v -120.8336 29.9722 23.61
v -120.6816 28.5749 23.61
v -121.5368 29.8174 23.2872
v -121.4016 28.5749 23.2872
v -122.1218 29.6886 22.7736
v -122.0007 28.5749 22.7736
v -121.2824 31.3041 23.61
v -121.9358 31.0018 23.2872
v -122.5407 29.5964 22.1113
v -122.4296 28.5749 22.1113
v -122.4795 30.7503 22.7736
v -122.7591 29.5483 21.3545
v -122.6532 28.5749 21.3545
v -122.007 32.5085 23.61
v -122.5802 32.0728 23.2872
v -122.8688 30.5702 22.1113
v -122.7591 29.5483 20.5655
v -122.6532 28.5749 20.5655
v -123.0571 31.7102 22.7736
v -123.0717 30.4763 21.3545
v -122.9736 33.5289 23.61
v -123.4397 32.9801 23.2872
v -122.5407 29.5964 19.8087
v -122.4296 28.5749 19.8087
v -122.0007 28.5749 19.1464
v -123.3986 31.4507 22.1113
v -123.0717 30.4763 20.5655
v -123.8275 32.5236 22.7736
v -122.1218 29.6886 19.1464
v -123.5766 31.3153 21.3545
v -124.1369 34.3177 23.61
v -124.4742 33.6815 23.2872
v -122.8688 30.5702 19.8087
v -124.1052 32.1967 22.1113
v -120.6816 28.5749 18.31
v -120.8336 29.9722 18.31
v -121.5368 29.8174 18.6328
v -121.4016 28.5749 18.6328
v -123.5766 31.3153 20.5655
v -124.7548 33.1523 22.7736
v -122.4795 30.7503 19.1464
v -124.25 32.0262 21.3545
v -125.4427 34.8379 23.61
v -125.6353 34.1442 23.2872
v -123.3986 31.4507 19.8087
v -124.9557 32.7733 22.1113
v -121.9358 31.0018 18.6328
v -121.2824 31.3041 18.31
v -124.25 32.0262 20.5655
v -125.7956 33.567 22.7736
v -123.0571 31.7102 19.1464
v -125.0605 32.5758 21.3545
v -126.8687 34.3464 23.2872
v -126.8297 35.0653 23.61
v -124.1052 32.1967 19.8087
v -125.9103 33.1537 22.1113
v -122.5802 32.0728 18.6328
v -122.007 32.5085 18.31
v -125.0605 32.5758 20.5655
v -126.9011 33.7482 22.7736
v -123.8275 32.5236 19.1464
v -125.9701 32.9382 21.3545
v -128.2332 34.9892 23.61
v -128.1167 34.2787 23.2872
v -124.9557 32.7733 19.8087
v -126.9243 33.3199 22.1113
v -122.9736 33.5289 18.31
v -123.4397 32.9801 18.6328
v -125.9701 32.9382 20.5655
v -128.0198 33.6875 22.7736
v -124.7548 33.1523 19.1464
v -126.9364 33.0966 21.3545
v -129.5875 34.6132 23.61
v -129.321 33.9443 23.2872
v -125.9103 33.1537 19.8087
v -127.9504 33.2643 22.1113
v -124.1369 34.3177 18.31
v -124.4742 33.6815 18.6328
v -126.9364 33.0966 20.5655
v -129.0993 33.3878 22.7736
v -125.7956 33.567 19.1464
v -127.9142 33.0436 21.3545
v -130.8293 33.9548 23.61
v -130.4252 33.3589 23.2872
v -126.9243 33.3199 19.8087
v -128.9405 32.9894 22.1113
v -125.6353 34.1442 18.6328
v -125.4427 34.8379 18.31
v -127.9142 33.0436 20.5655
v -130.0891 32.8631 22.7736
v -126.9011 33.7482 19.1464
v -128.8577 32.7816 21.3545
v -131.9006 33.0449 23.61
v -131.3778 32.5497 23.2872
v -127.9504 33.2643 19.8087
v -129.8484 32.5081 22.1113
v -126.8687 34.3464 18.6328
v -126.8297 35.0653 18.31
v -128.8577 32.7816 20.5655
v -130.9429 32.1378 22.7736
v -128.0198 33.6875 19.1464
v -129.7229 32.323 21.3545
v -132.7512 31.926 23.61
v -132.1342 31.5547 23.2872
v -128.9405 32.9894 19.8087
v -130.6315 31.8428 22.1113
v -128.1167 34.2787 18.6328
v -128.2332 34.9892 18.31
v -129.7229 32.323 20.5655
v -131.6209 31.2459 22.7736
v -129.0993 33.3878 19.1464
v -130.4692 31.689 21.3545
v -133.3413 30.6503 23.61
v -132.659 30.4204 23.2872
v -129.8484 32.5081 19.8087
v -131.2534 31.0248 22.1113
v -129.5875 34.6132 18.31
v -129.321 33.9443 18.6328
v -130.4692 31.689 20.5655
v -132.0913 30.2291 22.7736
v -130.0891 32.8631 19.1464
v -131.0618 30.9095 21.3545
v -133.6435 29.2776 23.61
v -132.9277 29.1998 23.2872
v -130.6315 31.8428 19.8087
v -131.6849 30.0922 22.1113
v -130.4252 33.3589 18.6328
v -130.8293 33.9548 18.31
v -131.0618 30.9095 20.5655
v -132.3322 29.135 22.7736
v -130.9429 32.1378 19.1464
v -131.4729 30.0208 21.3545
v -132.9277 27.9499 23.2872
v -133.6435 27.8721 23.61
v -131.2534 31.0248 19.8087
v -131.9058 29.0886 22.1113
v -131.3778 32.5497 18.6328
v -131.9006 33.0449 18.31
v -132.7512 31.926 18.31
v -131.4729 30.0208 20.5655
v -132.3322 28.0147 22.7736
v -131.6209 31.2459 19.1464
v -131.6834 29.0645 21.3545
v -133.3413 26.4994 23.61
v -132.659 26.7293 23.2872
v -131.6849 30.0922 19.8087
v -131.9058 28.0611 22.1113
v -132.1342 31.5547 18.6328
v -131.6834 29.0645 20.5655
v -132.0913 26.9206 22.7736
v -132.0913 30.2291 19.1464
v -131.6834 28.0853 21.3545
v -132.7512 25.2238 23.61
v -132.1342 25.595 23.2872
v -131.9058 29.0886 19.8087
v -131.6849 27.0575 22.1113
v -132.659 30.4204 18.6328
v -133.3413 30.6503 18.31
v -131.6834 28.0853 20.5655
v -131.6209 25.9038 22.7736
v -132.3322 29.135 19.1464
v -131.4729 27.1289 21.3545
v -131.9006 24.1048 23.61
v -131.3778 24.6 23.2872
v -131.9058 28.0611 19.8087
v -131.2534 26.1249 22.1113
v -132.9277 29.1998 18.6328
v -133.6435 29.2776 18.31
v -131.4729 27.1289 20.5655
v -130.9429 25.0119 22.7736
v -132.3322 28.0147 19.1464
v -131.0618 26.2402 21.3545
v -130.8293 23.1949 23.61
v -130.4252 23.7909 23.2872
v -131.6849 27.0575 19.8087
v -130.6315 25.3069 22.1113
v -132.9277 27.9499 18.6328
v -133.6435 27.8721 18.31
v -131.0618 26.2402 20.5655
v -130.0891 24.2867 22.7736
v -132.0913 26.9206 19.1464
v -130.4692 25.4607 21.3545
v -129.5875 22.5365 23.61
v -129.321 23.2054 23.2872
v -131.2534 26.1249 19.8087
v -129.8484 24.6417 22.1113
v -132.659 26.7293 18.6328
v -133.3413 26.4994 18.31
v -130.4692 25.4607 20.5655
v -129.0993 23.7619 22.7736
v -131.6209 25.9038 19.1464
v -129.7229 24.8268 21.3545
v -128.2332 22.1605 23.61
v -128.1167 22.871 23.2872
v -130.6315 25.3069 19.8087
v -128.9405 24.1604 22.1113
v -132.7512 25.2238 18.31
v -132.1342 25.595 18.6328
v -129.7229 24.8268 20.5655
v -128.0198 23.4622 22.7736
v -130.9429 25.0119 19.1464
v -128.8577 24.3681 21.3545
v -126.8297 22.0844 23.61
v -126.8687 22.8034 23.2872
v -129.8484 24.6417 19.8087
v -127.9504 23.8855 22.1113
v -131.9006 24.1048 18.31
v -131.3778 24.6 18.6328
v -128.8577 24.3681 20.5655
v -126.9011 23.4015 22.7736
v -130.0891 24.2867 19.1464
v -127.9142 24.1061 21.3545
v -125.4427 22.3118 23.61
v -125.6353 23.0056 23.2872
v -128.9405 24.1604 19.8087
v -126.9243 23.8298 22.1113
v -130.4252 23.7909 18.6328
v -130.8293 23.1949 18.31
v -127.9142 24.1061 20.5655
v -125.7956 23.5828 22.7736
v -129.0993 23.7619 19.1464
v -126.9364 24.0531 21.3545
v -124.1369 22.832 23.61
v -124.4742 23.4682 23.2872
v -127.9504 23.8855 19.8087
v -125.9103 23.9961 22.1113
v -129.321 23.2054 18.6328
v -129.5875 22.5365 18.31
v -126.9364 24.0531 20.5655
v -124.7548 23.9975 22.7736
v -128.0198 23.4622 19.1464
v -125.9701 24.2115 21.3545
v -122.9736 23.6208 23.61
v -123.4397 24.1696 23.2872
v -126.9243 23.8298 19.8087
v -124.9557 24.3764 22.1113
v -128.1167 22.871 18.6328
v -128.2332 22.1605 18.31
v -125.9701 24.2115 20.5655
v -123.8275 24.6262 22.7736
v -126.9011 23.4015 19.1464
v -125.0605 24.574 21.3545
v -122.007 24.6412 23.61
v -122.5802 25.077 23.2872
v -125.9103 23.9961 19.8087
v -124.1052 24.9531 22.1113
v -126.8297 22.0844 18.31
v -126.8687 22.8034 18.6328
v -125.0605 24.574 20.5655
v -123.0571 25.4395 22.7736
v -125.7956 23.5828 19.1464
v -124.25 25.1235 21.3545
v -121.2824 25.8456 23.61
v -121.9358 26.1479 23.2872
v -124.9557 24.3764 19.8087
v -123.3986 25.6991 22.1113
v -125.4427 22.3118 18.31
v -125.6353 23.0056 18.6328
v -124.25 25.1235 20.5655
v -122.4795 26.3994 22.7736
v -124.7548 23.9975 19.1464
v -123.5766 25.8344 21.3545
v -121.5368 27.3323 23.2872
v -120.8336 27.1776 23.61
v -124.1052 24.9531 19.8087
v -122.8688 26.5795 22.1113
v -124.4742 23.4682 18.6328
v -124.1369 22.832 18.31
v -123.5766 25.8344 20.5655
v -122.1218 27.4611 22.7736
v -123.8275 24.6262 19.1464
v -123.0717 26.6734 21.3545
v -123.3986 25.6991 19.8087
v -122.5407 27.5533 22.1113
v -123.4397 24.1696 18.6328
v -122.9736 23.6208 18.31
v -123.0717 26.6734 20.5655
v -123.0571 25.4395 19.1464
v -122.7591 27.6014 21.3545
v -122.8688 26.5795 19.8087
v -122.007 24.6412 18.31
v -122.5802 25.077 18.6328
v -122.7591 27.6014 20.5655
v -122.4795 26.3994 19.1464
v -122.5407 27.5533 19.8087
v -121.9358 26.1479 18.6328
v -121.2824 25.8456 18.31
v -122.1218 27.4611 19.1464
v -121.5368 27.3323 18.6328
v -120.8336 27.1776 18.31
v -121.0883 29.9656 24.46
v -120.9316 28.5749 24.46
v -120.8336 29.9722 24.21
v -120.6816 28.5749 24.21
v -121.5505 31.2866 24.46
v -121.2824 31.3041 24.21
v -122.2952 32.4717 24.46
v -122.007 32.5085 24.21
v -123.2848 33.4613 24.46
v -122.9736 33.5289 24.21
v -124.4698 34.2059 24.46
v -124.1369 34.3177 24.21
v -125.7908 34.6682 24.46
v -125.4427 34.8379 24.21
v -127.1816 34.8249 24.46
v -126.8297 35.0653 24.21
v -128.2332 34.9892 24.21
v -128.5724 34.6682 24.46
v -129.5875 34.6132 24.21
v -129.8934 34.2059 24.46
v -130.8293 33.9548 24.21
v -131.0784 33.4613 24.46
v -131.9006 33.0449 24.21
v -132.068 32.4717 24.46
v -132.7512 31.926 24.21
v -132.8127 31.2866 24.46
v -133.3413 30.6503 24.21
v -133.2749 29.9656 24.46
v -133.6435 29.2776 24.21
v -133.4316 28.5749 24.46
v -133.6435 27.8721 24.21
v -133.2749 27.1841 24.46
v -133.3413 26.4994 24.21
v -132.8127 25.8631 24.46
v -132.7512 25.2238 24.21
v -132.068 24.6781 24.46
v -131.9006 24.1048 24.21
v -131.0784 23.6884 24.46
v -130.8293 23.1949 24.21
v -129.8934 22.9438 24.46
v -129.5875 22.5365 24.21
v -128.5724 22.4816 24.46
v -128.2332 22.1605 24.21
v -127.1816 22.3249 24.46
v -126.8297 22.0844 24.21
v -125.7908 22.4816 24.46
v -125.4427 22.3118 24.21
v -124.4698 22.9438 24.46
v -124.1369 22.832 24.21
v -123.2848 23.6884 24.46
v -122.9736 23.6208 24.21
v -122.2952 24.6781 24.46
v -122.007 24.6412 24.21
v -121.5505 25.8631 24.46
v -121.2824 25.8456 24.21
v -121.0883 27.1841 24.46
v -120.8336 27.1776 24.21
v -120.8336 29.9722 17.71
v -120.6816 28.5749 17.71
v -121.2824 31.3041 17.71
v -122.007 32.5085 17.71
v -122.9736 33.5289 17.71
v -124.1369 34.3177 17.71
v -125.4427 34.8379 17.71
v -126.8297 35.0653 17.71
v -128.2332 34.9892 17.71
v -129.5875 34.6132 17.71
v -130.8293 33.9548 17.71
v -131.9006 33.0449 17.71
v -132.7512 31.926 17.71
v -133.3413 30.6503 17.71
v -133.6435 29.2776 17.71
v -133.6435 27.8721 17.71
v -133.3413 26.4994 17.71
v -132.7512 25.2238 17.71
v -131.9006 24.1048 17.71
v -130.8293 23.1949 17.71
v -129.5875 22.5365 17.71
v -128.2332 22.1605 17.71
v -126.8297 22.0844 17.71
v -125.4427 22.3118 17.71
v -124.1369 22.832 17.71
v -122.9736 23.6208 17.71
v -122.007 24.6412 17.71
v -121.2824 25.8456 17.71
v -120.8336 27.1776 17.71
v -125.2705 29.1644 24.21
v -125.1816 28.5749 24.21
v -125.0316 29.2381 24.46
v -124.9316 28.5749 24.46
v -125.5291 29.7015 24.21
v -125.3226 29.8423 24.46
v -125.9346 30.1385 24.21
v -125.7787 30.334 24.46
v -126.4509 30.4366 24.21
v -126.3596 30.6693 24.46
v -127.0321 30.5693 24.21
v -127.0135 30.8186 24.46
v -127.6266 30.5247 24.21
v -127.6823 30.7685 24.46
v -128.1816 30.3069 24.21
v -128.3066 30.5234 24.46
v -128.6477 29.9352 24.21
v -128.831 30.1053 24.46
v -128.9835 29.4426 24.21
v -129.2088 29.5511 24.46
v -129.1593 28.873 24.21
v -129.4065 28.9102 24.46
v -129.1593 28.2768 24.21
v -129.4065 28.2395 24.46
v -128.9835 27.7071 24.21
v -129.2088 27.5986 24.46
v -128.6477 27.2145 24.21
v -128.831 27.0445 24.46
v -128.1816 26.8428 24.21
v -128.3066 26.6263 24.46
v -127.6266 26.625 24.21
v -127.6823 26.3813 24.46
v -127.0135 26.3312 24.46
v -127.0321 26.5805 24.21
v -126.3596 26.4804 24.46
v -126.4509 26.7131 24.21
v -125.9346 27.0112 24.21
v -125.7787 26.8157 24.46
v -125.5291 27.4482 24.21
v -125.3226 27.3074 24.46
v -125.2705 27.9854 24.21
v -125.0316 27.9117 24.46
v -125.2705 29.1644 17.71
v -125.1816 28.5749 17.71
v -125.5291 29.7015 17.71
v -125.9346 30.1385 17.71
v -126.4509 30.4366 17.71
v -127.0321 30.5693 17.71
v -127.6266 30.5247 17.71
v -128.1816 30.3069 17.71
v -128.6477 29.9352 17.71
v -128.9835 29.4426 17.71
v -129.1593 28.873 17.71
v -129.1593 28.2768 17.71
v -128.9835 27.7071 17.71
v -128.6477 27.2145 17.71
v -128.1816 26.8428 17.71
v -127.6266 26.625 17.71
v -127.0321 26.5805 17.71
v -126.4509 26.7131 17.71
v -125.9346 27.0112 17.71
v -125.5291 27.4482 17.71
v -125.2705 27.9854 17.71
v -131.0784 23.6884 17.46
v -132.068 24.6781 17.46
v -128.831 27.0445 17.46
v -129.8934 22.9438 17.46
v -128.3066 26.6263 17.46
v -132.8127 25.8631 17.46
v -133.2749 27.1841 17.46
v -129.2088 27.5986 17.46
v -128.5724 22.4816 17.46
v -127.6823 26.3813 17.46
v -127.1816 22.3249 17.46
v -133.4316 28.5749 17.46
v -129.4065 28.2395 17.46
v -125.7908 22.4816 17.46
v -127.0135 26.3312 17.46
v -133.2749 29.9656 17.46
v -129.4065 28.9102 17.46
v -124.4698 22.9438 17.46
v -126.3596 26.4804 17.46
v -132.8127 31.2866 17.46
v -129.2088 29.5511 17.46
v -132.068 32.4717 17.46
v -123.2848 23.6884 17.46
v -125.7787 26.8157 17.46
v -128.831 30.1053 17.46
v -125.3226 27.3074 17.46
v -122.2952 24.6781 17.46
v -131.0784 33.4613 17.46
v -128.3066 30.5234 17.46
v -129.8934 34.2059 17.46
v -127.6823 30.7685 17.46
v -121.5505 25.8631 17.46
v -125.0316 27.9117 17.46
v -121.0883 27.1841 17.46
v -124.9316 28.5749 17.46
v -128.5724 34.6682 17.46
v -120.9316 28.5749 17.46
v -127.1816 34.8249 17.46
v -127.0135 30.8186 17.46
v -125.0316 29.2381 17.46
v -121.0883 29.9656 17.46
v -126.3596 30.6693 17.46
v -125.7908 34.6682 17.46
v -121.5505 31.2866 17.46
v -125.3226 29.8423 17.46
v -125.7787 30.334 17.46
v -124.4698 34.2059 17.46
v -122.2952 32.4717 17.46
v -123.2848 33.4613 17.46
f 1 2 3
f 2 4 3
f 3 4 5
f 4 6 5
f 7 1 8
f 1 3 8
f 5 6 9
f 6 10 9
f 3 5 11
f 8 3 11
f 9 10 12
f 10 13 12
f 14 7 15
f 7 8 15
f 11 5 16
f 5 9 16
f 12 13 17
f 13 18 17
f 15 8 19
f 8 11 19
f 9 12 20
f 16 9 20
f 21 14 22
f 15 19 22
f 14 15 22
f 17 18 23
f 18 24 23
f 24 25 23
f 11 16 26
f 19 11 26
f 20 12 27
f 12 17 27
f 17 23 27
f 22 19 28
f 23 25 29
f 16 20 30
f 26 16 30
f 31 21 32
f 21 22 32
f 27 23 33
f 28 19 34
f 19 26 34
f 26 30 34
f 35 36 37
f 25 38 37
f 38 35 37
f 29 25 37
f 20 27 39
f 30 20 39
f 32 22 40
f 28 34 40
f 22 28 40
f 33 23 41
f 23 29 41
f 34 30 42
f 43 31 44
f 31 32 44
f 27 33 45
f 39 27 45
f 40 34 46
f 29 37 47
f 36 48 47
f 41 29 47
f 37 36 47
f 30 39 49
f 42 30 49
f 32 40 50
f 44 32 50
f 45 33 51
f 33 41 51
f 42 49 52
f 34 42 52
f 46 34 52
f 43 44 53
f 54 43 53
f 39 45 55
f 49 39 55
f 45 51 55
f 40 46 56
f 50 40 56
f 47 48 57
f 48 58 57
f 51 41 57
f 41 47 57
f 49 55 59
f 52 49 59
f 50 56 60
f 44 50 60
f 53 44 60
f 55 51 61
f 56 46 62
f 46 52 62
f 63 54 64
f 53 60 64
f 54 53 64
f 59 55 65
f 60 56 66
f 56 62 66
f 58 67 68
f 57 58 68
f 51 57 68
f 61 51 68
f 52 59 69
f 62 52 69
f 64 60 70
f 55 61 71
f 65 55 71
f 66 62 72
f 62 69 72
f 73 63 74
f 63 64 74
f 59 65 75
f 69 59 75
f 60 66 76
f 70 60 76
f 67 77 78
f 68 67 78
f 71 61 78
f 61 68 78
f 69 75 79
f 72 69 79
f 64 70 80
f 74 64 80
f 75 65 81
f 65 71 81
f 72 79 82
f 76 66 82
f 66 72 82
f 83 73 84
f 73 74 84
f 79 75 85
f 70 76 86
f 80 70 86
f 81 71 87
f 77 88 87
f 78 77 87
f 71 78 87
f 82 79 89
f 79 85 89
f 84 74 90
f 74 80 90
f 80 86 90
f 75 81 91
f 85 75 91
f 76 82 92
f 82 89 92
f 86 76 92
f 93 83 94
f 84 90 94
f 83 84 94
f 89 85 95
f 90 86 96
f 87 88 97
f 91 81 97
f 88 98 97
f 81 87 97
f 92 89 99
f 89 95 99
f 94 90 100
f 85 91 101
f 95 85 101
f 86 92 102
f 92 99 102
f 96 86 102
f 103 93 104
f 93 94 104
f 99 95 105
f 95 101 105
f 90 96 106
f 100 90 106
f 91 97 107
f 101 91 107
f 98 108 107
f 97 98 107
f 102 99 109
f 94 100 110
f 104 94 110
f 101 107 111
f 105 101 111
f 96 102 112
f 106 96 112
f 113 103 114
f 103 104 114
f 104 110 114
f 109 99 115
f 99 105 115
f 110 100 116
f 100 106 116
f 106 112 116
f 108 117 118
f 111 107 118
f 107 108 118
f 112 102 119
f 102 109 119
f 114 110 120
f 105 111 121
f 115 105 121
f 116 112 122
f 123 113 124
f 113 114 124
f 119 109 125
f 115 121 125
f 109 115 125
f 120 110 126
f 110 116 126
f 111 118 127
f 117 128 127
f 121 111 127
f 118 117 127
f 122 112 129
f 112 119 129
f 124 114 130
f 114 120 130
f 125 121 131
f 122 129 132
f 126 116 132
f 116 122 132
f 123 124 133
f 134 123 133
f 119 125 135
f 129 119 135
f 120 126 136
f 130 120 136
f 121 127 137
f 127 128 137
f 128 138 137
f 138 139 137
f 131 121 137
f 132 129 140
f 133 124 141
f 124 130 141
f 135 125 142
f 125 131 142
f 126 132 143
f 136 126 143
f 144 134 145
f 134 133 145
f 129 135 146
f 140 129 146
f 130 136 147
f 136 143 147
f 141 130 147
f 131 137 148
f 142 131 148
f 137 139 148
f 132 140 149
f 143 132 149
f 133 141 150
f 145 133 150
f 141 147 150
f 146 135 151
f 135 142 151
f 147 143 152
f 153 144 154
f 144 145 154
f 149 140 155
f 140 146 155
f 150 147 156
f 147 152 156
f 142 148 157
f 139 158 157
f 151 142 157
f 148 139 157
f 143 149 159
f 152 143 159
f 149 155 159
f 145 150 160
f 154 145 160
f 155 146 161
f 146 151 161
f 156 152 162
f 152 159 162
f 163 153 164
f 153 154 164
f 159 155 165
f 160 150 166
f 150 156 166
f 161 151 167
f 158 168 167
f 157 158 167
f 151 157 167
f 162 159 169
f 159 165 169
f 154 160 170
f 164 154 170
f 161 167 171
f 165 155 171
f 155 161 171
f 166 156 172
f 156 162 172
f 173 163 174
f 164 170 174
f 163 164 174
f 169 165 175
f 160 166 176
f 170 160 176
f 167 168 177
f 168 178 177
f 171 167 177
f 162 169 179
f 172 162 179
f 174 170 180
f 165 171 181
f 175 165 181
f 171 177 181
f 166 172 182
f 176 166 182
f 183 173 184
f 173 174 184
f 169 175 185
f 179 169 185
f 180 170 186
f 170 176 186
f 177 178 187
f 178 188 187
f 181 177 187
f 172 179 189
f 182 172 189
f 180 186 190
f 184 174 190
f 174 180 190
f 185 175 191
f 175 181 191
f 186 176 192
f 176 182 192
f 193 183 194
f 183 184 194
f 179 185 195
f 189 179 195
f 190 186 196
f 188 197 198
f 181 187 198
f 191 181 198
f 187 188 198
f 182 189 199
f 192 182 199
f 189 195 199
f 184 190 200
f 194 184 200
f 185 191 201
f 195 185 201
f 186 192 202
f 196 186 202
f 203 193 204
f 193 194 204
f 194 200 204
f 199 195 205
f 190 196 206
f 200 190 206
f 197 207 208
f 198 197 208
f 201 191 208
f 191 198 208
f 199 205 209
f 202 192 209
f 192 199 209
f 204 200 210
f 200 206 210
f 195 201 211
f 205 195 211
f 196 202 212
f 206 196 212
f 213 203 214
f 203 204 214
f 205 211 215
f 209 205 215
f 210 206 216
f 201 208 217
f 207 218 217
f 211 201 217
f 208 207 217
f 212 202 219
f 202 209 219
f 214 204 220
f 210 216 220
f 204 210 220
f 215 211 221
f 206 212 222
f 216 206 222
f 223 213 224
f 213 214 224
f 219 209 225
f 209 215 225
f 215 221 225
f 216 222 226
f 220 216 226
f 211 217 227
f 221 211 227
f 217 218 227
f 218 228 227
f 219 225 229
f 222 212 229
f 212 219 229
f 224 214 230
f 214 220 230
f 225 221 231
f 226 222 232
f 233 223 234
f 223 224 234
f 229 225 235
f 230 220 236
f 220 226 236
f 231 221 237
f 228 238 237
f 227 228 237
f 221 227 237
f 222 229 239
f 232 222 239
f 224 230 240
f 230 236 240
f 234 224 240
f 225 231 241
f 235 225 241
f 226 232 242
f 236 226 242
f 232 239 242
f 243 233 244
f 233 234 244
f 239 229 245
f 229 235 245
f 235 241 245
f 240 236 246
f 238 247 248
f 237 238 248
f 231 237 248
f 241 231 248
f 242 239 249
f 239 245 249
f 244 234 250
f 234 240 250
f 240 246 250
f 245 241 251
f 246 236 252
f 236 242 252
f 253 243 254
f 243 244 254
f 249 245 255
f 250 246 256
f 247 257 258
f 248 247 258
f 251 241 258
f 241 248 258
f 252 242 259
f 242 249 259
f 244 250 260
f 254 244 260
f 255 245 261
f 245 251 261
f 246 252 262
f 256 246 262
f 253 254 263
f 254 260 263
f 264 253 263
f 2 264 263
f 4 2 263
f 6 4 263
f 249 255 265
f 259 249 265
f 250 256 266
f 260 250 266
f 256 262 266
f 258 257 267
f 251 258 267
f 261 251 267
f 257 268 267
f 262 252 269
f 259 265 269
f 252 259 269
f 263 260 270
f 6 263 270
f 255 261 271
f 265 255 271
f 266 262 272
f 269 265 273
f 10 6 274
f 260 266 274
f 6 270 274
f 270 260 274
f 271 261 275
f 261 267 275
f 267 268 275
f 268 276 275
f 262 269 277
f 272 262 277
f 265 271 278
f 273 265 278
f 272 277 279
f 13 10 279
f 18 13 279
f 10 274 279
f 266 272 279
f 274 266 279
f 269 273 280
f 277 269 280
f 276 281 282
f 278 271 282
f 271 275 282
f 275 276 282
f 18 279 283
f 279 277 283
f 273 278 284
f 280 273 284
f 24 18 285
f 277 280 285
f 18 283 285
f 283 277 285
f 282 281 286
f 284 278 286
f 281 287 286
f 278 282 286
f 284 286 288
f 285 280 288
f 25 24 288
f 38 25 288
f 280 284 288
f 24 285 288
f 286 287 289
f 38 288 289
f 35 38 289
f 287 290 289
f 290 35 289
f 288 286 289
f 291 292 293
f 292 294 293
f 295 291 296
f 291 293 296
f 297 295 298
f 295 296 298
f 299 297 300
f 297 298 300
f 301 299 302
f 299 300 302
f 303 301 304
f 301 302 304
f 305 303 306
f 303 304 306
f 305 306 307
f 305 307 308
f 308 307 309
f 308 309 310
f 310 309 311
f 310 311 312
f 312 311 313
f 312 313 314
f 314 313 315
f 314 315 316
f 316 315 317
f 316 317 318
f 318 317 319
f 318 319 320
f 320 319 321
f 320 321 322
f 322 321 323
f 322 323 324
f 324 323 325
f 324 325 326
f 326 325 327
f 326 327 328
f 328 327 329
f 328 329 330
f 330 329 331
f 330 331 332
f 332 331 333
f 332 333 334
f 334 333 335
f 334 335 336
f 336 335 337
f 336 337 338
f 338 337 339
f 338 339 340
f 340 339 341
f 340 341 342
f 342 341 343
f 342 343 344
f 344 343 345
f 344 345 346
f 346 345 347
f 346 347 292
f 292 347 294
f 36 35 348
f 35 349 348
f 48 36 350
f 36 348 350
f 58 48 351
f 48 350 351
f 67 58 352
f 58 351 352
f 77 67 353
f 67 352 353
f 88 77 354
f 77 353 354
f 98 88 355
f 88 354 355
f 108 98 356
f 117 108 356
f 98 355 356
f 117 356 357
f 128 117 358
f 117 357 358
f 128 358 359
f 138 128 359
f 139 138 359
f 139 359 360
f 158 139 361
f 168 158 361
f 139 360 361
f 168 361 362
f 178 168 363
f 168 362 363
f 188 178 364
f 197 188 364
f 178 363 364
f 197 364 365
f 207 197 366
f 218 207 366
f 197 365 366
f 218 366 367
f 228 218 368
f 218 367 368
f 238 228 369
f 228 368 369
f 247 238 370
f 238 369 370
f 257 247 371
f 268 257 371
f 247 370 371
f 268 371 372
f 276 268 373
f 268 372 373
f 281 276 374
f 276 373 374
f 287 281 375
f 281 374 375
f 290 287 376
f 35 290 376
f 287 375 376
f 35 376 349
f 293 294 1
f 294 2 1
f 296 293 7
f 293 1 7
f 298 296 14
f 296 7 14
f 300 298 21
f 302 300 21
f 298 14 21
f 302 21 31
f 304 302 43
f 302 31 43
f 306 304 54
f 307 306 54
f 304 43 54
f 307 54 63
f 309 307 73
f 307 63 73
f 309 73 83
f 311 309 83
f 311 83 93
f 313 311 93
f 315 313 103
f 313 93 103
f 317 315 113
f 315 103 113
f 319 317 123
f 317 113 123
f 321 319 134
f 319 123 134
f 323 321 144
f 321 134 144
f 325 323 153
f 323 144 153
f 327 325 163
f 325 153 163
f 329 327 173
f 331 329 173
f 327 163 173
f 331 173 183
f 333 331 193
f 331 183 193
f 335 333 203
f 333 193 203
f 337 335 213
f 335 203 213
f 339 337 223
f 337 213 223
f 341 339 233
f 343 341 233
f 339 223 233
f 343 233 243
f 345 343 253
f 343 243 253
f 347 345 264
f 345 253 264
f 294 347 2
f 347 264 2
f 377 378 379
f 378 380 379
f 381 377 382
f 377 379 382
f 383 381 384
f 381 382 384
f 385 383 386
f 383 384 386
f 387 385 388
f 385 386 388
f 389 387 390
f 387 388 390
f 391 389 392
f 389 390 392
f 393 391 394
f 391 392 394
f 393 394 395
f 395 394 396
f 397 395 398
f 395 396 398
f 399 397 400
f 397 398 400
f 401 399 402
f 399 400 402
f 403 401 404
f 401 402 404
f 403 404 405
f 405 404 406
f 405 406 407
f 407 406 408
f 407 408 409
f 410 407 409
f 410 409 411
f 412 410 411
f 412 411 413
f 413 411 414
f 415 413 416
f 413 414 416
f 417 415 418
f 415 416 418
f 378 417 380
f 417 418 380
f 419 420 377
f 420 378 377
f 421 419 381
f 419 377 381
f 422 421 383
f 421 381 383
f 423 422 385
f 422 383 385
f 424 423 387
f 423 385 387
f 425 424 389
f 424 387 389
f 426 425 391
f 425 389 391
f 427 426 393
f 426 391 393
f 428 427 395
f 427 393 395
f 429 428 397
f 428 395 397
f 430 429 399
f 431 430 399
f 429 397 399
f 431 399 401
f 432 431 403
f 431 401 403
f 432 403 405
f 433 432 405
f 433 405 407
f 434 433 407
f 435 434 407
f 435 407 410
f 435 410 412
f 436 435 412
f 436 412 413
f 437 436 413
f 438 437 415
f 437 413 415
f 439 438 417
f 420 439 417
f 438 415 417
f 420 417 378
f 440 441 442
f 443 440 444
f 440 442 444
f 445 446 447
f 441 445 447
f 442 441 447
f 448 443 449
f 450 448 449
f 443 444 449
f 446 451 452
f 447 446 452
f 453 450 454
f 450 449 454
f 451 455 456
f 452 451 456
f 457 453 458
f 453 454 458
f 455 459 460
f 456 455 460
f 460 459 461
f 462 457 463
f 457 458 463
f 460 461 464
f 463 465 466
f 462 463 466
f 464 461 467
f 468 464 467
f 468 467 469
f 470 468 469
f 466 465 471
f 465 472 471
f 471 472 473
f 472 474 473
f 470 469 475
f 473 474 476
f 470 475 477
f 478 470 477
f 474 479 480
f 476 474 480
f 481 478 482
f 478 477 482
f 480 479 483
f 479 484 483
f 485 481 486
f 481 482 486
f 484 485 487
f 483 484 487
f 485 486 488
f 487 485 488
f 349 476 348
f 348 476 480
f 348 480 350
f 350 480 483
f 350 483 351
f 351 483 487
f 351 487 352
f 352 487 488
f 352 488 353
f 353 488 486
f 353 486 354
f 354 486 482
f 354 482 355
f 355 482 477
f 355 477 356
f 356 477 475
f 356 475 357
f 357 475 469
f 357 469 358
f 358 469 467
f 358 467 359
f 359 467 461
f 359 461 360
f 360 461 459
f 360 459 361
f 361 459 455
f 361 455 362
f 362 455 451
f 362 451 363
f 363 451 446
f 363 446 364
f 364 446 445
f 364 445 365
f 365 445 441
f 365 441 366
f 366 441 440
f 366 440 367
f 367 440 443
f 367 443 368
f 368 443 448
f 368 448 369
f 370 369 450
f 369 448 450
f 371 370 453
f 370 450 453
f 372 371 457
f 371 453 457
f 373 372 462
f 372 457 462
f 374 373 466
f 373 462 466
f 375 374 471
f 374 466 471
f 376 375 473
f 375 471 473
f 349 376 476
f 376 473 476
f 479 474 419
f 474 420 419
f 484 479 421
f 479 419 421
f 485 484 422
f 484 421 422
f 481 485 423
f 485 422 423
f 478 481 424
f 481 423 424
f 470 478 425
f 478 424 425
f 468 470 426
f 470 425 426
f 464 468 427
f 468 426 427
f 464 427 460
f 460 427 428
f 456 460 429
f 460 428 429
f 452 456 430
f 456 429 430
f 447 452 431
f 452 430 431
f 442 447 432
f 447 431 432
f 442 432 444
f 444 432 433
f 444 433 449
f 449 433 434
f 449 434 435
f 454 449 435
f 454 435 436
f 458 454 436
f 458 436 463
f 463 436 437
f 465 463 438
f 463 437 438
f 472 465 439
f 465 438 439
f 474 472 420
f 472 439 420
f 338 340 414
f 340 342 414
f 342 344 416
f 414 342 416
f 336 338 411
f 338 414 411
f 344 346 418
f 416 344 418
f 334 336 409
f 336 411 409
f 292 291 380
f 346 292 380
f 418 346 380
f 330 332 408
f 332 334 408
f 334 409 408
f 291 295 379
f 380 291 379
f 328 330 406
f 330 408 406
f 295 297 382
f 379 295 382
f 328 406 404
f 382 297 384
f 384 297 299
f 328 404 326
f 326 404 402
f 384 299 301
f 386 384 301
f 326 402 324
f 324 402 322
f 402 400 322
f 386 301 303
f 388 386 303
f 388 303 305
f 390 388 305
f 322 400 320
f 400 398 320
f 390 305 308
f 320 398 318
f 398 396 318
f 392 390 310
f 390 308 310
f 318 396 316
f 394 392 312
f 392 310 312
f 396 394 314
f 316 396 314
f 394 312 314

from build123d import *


with BuildPart() as part:
    # Sketch1 → Revolve1 (revolve)
    with BuildSketch(Plane(origin=(0, 28.574866342, 0), x_dir=(1, 0, 0), z_dir=(0, 1, 0))):
        with BuildLine():
            Line((-120.681601968, -17.71), (-120.931601968, -17.46))
            Line((-120.931601968, -17.46), (-124.931601968, -17.46))
            Line((-124.931601968, -17.46), (-125.181601968, -17.71))
            Line((-125.181601968, -17.71), (-125.181601968, -24.21))
            Line((-125.181601968, -24.21), (-124.931601968, -24.46))
            Line((-124.931601968, -24.46), (-120.931601968, -24.46))
            Line((-120.931601968, -24.46), (-120.681601968, -24.21))
            Line((-120.681601968, -24.21), (-120.681601968, -23.61))
            ThreePointArc((-120.681601968, -23.61), (-122.681601968, -20.96), (-120.681601968, -18.31))
            Line((-120.681601968, -18.31), (-120.681601968, -17.71))
        make_face()
    revolve(axis=Axis((-127.181601968, 28.574866342, 17.46), (0, 0, 1)))


solid = part.part
